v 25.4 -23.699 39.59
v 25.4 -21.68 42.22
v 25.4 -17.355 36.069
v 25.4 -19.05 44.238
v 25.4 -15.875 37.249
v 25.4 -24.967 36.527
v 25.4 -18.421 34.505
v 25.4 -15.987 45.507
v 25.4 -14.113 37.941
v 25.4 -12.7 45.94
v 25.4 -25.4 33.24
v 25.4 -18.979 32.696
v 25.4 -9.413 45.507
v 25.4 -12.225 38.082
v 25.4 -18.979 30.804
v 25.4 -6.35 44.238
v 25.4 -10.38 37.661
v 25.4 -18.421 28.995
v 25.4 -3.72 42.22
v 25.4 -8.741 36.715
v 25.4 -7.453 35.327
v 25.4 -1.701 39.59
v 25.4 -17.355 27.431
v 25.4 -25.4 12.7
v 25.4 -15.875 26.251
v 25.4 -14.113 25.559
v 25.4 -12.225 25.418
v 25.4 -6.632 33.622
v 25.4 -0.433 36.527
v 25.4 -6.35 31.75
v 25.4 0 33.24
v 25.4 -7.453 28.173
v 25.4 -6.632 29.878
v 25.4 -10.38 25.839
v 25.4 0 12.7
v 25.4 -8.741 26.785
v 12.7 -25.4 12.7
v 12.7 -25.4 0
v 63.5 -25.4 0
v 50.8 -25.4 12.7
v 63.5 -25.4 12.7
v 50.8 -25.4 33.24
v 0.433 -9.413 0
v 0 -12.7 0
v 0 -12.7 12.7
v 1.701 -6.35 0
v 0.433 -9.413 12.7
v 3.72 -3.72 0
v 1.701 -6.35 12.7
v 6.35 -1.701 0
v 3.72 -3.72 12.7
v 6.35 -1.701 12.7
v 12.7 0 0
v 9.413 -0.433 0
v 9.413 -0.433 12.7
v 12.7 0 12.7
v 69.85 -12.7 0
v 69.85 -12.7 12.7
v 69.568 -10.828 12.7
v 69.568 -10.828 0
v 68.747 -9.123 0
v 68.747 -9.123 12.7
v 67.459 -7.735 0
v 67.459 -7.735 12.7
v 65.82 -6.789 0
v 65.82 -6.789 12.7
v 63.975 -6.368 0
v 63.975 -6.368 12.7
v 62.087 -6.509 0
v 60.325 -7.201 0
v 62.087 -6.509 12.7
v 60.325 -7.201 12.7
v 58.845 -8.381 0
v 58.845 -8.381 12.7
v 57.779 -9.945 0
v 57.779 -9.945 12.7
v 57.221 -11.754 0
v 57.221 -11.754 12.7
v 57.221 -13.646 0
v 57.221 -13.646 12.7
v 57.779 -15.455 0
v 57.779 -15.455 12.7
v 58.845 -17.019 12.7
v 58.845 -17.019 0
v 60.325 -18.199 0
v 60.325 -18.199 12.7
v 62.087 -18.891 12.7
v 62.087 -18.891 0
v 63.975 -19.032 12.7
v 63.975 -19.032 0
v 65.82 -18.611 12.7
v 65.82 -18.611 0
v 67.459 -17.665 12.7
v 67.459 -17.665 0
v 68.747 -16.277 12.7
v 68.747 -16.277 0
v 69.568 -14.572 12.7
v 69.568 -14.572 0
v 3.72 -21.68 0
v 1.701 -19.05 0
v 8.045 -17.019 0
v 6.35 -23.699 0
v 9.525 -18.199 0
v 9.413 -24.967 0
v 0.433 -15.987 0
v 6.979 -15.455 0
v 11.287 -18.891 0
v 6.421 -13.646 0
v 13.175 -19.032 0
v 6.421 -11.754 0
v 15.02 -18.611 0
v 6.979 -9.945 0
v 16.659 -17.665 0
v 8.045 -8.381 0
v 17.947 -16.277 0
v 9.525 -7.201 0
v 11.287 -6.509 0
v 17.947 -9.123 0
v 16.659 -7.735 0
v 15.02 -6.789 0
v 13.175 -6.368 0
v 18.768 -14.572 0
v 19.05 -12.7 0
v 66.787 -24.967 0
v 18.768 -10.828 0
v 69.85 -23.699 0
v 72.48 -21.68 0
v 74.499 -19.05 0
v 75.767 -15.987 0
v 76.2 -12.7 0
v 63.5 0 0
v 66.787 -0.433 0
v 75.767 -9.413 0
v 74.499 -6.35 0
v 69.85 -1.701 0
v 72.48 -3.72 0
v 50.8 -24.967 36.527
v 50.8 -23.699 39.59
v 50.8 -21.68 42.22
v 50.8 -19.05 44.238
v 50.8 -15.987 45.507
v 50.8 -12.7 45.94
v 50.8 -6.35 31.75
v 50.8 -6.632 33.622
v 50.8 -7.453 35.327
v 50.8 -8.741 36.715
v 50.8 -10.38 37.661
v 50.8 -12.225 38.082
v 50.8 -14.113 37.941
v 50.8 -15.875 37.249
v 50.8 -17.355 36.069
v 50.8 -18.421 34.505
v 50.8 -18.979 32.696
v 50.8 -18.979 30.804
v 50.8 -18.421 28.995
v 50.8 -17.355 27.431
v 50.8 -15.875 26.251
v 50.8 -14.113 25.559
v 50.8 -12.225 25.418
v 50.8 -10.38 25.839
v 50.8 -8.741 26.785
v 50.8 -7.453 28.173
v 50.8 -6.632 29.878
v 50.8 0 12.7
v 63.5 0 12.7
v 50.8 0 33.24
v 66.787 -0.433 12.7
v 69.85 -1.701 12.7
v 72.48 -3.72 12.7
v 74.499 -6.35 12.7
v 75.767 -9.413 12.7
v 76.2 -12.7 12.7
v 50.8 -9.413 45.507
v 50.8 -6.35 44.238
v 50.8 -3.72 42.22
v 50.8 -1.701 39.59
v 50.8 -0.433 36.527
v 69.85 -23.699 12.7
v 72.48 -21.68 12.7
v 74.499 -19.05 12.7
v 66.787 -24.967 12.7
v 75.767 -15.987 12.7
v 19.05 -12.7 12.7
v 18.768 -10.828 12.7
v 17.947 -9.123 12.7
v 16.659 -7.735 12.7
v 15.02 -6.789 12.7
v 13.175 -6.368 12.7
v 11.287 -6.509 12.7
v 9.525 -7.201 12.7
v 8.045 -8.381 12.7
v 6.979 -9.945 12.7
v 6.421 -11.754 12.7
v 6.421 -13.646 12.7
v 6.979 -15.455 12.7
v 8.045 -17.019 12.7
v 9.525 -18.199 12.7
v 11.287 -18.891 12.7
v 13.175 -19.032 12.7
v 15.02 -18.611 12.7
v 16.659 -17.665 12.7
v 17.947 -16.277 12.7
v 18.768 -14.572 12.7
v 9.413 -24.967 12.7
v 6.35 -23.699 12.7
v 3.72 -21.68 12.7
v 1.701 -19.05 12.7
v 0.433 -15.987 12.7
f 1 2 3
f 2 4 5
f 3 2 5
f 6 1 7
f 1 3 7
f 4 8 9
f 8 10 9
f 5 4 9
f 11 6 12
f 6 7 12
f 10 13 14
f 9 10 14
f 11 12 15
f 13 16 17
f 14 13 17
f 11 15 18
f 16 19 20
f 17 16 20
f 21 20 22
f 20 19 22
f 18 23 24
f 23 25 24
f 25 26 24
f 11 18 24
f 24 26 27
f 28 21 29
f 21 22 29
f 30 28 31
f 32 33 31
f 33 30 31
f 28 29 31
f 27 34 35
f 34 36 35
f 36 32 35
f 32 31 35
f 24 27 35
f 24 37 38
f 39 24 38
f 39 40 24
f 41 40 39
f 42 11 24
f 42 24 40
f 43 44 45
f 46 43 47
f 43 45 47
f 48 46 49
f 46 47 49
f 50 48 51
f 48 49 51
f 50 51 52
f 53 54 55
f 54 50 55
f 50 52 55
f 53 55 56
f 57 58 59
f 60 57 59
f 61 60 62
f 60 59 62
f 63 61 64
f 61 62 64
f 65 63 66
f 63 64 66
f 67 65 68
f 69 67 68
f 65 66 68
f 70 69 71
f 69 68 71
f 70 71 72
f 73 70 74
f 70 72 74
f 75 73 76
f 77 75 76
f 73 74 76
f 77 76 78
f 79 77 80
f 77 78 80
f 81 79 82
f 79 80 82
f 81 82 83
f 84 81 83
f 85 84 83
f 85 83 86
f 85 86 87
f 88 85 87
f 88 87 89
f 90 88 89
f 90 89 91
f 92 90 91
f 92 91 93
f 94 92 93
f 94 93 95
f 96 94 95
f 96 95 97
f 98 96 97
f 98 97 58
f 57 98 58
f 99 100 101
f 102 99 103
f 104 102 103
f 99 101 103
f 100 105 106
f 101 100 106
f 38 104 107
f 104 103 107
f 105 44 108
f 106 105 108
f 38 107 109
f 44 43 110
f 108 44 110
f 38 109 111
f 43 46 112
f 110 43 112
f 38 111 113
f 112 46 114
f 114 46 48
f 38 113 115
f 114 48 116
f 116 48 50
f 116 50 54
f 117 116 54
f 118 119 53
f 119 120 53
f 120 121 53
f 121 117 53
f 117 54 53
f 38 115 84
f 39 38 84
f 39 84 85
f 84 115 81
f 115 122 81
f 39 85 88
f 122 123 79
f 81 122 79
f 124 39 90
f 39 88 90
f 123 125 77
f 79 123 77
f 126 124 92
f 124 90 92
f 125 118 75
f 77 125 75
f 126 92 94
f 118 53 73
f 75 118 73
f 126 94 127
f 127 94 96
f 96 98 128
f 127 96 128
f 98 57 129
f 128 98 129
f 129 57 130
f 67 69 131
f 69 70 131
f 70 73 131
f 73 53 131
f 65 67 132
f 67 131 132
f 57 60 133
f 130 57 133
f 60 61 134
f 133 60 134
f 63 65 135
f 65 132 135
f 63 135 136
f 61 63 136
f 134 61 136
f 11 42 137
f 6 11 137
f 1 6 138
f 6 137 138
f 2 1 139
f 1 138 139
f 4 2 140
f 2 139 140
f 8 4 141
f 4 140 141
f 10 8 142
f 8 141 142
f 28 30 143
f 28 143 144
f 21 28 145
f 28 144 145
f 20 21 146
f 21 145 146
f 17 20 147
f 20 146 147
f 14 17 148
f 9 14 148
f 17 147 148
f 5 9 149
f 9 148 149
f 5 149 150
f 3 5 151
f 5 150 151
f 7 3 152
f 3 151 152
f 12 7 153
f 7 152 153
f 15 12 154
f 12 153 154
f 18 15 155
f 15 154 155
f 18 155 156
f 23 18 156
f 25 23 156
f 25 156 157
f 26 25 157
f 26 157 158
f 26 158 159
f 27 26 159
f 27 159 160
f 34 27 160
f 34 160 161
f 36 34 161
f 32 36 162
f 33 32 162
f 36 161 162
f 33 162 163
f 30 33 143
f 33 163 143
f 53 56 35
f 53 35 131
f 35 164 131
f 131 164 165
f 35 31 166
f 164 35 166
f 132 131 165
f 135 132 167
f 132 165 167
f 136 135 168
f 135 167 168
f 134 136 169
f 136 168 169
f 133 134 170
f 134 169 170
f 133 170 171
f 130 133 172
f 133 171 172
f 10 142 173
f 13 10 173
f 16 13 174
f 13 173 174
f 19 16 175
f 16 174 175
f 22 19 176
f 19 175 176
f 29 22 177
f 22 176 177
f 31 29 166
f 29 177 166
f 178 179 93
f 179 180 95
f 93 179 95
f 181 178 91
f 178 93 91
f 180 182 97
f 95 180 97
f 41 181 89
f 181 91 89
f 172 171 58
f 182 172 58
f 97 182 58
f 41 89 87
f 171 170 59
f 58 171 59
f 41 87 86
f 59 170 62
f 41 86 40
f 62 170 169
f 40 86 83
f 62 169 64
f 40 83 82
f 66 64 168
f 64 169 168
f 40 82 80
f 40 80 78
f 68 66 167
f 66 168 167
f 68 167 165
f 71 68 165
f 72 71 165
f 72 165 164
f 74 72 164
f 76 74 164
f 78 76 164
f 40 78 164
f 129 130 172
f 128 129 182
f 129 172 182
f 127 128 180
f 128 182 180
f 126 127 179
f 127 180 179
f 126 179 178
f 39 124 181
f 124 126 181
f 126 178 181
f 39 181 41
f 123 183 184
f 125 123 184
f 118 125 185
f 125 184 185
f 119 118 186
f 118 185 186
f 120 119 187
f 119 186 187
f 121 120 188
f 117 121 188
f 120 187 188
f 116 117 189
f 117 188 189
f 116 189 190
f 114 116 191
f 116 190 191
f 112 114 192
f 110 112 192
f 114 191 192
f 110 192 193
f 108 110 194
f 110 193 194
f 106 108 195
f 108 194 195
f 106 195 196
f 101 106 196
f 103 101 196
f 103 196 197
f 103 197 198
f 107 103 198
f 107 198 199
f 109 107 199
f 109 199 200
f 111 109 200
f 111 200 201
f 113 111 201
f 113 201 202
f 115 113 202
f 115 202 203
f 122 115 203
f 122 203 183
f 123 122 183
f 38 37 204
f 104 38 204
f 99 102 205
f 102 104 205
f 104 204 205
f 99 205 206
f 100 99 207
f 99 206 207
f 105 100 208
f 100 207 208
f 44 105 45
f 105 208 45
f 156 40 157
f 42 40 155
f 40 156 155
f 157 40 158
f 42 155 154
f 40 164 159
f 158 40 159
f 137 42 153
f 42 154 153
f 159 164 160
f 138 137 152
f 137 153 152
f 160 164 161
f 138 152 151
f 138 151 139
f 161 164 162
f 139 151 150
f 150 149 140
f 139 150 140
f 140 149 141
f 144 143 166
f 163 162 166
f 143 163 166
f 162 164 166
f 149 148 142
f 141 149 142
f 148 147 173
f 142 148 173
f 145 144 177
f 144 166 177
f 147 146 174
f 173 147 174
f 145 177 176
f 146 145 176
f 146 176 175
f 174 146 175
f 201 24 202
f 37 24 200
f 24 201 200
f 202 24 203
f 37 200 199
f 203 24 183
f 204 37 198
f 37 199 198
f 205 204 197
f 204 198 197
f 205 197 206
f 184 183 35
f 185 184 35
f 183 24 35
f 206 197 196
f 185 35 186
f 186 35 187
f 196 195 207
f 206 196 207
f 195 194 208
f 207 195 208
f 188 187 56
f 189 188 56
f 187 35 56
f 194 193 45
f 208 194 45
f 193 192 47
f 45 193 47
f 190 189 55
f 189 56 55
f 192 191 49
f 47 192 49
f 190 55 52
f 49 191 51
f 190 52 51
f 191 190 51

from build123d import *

# Parameters (mm, degrees)
F1_DEPTH = 25.4
F3_R     = 6.35
F2_R     = 6.35
F5_DEPTH = 25.4
F4_R     = 6.35
F6_DEPTH = 25.4


with BuildPart() as f1:
    # F0 (on Front) → F1 (new body)
    with BuildSketch(Plane.XZ):
        Polygon((0, 12.7), (0, 0), (76.2, 0), (76.2, 12.7), (50.8, 12.7), (50.8, 45.939504), (25.4, 45.939504), (25.4, 12.7), align=None)
    extrude(amount=F1_DEPTH)

    # F3 (on face) + F2 (on face) → F5 (cut)
    with BuildSketch(Plane.XY.offset(12.7)):
        with BuildLine():
            ThreePointArc((0, -12.7), (3.719744, -3.719744), (12.7, 0))
            Line((12.7, 0), (0, 0))
            Line((0, 0), (0, -12.7))
        make_face()
        with Locations((12.7, -12.7)):
            Circle(F3_R)
        with BuildLine():
            ThreePointArc((12.7, -25.4), (3.719744, -21.680256), (0, -12.7))
            Line((0, -12.7), (0, -25.4))
            Line((0, -25.4), (12.7, -25.4))
        make_face()
    with BuildSketch(Plane.XY.offset(12.7)):
        with Locations((63.5, -12.7)):
            Circle(F2_R)
        with BuildLine():
            ThreePointArc((63.5, 0), (72.480256, -3.719744), (76.2, -12.7))
            Line((76.2, -12.7), (76.2, 0))
            Line((76.2, 0), (63.5, 0))
        make_face()
        with BuildLine():
            ThreePointArc((76.2, -12.7), (72.480256, -21.680256), (63.5, -25.4))
            Line((63.5, -25.4), (76.2, -25.4))
            Line((76.2, -25.4), (76.2, -12.7))
        make_face()
    extrude(amount=-F5_DEPTH, mode=Mode.SUBTRACT)

    # F4 (on face) → F6 (cut)
    with BuildSketch(Plane.YZ.offset(50.8)):
        with Locations((-12.7, 31.75)):
            Circle(F4_R)
        with BuildLine():
            ThreePointArc((-12.7, 45.939504), (-3.719744, 42.21976), (0, 33.239504))
            Line((0, 33.239504), (0, 45.939504))
            Line((0, 45.939504), (-12.7, 45.939504))
        make_face()
        with BuildLine():
            ThreePointArc((-25.4, 33.239504), (-21.680256, 42.21976), (-12.7, 45.939504))
            Line((-12.7, 45.939504), (-25.4, 45.939504))
            Line((-25.4, 45.939504), (-25.4, 33.239504))
        make_face()
    extrude(amount=-F6_DEPTH, mode=Mode.SUBTRACT)


solid = f1.part
